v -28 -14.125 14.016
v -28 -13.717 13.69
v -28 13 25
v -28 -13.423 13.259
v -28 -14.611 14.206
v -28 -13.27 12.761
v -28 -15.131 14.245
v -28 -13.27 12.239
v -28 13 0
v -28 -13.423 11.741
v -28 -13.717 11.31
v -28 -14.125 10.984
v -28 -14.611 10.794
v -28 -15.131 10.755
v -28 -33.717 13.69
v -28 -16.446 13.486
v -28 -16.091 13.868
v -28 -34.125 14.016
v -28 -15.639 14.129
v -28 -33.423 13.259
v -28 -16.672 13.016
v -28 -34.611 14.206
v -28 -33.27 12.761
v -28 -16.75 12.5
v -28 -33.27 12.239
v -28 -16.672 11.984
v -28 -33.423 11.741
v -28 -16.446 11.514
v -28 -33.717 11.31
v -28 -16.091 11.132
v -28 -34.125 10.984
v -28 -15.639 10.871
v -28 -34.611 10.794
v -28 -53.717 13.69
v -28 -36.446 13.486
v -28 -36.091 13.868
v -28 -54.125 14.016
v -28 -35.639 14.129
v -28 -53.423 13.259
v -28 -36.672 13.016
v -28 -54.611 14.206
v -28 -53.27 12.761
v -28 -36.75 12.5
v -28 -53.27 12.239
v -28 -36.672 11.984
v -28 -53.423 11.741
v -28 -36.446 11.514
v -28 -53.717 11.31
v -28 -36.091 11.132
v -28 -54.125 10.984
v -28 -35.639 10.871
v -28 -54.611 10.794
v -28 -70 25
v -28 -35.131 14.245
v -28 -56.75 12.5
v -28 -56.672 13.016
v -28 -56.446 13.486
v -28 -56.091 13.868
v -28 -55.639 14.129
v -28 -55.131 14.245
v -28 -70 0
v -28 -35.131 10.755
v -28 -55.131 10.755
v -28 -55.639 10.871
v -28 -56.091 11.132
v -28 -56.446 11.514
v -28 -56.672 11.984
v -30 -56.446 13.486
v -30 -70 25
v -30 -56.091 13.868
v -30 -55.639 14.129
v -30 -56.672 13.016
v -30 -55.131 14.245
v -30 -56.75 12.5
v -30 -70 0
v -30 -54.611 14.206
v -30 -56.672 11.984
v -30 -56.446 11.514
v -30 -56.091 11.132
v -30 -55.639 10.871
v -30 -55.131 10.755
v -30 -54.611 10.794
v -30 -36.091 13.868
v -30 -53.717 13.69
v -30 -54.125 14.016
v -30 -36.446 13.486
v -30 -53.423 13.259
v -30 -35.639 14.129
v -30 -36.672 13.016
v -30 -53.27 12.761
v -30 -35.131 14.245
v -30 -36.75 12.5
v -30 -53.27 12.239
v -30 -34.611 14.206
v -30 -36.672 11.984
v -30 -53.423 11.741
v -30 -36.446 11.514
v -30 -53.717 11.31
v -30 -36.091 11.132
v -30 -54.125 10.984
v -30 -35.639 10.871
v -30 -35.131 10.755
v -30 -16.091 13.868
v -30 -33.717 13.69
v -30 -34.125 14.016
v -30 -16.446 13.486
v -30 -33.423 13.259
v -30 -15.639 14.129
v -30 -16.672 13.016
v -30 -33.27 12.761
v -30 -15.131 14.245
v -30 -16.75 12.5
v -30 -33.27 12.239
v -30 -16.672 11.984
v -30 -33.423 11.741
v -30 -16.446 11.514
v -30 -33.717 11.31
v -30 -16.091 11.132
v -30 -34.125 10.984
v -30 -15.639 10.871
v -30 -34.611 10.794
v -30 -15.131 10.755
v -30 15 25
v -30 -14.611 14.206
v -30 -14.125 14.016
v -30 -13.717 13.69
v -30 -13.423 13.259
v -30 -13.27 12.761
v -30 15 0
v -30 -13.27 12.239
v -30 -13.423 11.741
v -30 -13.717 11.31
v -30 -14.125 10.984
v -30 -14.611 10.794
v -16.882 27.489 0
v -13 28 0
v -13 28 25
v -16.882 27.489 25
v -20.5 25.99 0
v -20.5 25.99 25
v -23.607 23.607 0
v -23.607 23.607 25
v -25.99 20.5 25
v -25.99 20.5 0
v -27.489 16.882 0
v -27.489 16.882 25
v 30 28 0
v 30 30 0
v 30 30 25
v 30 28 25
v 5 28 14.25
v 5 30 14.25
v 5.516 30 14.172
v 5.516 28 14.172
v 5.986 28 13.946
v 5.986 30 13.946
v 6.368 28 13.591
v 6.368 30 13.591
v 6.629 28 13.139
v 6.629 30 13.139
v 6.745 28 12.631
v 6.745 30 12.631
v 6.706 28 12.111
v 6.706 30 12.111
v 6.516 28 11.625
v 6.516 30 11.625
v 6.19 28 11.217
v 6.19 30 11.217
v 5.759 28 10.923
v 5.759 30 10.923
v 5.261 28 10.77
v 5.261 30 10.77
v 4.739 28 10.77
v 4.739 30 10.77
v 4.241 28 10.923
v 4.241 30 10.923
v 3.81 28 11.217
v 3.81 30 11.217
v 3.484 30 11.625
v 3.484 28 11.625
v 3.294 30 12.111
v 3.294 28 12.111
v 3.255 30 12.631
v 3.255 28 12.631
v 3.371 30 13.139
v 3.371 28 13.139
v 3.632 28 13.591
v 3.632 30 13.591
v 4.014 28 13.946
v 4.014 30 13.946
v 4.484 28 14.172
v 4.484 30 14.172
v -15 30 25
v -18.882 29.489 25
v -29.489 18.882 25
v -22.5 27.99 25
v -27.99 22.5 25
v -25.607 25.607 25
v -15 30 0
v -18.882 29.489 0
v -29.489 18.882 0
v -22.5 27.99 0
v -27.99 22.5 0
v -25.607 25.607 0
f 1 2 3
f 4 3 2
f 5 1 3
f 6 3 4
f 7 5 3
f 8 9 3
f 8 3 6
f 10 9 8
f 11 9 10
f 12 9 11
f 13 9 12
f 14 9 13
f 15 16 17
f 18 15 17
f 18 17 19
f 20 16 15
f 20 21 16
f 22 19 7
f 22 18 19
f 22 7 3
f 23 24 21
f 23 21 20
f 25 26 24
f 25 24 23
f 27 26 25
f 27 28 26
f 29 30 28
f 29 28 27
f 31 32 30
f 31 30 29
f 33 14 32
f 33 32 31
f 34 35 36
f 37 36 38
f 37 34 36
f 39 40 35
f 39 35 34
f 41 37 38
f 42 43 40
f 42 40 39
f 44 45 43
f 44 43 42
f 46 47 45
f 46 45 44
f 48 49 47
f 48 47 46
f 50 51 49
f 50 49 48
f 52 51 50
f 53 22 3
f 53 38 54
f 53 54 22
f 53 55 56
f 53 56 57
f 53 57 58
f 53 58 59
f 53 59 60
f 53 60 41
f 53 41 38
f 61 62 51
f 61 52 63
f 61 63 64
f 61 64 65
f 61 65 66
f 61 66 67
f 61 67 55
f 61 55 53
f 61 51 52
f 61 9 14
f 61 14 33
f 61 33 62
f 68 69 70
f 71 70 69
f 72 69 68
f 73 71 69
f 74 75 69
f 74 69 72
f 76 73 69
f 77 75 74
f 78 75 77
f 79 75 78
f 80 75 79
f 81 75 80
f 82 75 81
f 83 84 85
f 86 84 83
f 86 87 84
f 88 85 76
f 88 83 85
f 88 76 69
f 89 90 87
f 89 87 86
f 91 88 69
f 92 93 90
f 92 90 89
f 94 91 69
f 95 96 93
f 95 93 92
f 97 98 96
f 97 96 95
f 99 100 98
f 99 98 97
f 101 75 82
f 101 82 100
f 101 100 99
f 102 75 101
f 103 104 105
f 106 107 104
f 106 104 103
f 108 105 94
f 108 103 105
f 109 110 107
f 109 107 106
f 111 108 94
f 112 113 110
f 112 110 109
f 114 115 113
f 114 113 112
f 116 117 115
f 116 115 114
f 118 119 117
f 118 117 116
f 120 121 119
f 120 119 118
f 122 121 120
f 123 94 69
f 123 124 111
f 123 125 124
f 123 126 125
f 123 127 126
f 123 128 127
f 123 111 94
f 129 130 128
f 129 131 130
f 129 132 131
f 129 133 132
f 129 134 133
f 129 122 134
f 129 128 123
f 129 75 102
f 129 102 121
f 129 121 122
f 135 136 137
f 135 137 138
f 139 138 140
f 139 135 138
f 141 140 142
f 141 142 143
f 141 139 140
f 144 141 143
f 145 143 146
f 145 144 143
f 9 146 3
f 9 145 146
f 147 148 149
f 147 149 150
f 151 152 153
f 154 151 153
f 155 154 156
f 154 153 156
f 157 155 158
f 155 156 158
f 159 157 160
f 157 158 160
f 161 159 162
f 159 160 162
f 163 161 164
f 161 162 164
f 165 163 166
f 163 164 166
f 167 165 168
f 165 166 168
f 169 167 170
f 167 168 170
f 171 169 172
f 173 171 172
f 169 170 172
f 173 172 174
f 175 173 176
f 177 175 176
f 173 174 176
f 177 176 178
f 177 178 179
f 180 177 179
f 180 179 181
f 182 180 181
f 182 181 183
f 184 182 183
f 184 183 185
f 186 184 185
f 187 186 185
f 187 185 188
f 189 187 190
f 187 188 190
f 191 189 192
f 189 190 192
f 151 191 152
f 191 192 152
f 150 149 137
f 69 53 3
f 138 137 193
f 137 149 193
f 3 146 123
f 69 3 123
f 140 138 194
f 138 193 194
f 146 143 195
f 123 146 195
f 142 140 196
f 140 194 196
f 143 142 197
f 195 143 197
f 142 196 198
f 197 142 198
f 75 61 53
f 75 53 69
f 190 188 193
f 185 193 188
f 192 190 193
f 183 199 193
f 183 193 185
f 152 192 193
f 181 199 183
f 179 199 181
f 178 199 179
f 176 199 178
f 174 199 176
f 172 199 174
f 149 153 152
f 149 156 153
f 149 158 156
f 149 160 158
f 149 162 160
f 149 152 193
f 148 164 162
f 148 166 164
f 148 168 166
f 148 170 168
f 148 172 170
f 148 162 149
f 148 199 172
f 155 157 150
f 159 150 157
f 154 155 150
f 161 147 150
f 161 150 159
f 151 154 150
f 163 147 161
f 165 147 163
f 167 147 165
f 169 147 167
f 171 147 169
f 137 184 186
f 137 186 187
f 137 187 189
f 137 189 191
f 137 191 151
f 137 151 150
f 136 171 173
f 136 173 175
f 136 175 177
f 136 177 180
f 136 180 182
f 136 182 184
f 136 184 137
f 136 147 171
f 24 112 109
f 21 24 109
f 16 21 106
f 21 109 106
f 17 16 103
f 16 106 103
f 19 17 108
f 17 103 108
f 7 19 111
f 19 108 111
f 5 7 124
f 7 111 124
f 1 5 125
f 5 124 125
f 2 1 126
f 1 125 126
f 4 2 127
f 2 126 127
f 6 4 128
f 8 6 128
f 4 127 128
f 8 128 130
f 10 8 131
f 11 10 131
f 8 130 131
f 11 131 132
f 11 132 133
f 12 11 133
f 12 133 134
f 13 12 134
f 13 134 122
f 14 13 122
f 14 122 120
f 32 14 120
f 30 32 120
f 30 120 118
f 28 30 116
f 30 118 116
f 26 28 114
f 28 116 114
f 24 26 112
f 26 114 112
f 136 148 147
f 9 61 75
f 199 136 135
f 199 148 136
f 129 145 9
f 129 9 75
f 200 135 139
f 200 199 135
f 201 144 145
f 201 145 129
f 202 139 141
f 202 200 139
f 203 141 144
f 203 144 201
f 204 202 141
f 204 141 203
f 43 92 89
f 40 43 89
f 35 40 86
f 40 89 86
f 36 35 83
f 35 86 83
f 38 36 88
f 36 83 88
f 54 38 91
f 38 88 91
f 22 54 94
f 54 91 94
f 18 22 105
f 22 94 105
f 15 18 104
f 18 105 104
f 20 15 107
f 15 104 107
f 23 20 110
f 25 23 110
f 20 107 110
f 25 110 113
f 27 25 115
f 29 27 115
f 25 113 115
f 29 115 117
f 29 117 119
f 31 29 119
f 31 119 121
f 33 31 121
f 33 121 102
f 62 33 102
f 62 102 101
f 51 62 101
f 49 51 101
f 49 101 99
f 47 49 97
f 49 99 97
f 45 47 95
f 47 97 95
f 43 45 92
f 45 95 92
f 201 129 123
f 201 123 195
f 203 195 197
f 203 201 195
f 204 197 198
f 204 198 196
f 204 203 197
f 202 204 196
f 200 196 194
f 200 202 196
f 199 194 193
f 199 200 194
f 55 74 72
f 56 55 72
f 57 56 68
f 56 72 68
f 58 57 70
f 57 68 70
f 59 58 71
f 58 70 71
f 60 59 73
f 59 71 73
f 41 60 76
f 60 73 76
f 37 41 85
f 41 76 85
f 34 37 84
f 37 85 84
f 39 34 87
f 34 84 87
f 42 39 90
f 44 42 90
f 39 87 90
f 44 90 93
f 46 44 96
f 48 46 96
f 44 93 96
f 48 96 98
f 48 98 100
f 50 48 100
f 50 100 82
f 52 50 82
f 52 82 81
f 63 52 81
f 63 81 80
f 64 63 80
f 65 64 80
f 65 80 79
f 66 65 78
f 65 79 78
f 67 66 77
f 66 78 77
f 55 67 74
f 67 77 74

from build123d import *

# Parameters (mm, degrees)
BOSS_EXTRUDE1_DEPTH = 25
SKETCH2_R           = 1.75
CUT_EXTRUDE1_DEPTH  = 2
SKETCH3_R           = 1.75
CUT_EXTRUDE2_DEPTH  = 2


with BuildPart() as part:
    # Sketch1 → Boss-Extrude1 (new body)
    with BuildSketch(Plane.XY):
        with BuildLine():
            Line((-15, 30), (30, 30))
            Line((30, 30), (30, 28))
            Line((30, 28), (-13, 28))
            ThreePointArc((-13, 28), (-23.606601718, 23.606601718), (-28, 13))
            Line((-28, 13), (-28, -70))
            Line((-28, -70), (-30, -70))
            Line((-30, -70), (-30, 15))
            ThreePointArc((-30, 15), (-25.606601718, 25.606601718), (-15, 30))
        make_face()
    extrude(amount=BOSS_EXTRUDE1_DEPTH)

    # Sketch2 → Cut-Extrude1 (cut)
    with BuildSketch(Plane.ZY.offset(30)):
        with Locations(Location((12.5, -15, 0), (0, 0, 270))):
            Circle(SKETCH2_R)
        with Locations(Location((12.5, -35, 0), (0, 0, 270))):
            Circle(SKETCH2_R)
        with Locations(Location((12.5, -55, 0), (0, 0, 270))):
            Circle(SKETCH2_R)
    extrude(amount=-CUT_EXTRUDE1_DEPTH, mode=Mode.SUBTRACT)

    # Sketch3 → Cut-Extrude2 (cut)
    with BuildSketch(Plane(origin=(0, 30, 0), x_dir=(1, 0, 0), z_dir=(0, 1, 0))):
        with Locations(Location((5, -12.5, 0), (0, 0, 270))):
            Circle(SKETCH3_R)
    extrude(amount=-CUT_EXTRUDE2_DEPTH, mode=Mode.SUBTRACT)


solid = part.part
